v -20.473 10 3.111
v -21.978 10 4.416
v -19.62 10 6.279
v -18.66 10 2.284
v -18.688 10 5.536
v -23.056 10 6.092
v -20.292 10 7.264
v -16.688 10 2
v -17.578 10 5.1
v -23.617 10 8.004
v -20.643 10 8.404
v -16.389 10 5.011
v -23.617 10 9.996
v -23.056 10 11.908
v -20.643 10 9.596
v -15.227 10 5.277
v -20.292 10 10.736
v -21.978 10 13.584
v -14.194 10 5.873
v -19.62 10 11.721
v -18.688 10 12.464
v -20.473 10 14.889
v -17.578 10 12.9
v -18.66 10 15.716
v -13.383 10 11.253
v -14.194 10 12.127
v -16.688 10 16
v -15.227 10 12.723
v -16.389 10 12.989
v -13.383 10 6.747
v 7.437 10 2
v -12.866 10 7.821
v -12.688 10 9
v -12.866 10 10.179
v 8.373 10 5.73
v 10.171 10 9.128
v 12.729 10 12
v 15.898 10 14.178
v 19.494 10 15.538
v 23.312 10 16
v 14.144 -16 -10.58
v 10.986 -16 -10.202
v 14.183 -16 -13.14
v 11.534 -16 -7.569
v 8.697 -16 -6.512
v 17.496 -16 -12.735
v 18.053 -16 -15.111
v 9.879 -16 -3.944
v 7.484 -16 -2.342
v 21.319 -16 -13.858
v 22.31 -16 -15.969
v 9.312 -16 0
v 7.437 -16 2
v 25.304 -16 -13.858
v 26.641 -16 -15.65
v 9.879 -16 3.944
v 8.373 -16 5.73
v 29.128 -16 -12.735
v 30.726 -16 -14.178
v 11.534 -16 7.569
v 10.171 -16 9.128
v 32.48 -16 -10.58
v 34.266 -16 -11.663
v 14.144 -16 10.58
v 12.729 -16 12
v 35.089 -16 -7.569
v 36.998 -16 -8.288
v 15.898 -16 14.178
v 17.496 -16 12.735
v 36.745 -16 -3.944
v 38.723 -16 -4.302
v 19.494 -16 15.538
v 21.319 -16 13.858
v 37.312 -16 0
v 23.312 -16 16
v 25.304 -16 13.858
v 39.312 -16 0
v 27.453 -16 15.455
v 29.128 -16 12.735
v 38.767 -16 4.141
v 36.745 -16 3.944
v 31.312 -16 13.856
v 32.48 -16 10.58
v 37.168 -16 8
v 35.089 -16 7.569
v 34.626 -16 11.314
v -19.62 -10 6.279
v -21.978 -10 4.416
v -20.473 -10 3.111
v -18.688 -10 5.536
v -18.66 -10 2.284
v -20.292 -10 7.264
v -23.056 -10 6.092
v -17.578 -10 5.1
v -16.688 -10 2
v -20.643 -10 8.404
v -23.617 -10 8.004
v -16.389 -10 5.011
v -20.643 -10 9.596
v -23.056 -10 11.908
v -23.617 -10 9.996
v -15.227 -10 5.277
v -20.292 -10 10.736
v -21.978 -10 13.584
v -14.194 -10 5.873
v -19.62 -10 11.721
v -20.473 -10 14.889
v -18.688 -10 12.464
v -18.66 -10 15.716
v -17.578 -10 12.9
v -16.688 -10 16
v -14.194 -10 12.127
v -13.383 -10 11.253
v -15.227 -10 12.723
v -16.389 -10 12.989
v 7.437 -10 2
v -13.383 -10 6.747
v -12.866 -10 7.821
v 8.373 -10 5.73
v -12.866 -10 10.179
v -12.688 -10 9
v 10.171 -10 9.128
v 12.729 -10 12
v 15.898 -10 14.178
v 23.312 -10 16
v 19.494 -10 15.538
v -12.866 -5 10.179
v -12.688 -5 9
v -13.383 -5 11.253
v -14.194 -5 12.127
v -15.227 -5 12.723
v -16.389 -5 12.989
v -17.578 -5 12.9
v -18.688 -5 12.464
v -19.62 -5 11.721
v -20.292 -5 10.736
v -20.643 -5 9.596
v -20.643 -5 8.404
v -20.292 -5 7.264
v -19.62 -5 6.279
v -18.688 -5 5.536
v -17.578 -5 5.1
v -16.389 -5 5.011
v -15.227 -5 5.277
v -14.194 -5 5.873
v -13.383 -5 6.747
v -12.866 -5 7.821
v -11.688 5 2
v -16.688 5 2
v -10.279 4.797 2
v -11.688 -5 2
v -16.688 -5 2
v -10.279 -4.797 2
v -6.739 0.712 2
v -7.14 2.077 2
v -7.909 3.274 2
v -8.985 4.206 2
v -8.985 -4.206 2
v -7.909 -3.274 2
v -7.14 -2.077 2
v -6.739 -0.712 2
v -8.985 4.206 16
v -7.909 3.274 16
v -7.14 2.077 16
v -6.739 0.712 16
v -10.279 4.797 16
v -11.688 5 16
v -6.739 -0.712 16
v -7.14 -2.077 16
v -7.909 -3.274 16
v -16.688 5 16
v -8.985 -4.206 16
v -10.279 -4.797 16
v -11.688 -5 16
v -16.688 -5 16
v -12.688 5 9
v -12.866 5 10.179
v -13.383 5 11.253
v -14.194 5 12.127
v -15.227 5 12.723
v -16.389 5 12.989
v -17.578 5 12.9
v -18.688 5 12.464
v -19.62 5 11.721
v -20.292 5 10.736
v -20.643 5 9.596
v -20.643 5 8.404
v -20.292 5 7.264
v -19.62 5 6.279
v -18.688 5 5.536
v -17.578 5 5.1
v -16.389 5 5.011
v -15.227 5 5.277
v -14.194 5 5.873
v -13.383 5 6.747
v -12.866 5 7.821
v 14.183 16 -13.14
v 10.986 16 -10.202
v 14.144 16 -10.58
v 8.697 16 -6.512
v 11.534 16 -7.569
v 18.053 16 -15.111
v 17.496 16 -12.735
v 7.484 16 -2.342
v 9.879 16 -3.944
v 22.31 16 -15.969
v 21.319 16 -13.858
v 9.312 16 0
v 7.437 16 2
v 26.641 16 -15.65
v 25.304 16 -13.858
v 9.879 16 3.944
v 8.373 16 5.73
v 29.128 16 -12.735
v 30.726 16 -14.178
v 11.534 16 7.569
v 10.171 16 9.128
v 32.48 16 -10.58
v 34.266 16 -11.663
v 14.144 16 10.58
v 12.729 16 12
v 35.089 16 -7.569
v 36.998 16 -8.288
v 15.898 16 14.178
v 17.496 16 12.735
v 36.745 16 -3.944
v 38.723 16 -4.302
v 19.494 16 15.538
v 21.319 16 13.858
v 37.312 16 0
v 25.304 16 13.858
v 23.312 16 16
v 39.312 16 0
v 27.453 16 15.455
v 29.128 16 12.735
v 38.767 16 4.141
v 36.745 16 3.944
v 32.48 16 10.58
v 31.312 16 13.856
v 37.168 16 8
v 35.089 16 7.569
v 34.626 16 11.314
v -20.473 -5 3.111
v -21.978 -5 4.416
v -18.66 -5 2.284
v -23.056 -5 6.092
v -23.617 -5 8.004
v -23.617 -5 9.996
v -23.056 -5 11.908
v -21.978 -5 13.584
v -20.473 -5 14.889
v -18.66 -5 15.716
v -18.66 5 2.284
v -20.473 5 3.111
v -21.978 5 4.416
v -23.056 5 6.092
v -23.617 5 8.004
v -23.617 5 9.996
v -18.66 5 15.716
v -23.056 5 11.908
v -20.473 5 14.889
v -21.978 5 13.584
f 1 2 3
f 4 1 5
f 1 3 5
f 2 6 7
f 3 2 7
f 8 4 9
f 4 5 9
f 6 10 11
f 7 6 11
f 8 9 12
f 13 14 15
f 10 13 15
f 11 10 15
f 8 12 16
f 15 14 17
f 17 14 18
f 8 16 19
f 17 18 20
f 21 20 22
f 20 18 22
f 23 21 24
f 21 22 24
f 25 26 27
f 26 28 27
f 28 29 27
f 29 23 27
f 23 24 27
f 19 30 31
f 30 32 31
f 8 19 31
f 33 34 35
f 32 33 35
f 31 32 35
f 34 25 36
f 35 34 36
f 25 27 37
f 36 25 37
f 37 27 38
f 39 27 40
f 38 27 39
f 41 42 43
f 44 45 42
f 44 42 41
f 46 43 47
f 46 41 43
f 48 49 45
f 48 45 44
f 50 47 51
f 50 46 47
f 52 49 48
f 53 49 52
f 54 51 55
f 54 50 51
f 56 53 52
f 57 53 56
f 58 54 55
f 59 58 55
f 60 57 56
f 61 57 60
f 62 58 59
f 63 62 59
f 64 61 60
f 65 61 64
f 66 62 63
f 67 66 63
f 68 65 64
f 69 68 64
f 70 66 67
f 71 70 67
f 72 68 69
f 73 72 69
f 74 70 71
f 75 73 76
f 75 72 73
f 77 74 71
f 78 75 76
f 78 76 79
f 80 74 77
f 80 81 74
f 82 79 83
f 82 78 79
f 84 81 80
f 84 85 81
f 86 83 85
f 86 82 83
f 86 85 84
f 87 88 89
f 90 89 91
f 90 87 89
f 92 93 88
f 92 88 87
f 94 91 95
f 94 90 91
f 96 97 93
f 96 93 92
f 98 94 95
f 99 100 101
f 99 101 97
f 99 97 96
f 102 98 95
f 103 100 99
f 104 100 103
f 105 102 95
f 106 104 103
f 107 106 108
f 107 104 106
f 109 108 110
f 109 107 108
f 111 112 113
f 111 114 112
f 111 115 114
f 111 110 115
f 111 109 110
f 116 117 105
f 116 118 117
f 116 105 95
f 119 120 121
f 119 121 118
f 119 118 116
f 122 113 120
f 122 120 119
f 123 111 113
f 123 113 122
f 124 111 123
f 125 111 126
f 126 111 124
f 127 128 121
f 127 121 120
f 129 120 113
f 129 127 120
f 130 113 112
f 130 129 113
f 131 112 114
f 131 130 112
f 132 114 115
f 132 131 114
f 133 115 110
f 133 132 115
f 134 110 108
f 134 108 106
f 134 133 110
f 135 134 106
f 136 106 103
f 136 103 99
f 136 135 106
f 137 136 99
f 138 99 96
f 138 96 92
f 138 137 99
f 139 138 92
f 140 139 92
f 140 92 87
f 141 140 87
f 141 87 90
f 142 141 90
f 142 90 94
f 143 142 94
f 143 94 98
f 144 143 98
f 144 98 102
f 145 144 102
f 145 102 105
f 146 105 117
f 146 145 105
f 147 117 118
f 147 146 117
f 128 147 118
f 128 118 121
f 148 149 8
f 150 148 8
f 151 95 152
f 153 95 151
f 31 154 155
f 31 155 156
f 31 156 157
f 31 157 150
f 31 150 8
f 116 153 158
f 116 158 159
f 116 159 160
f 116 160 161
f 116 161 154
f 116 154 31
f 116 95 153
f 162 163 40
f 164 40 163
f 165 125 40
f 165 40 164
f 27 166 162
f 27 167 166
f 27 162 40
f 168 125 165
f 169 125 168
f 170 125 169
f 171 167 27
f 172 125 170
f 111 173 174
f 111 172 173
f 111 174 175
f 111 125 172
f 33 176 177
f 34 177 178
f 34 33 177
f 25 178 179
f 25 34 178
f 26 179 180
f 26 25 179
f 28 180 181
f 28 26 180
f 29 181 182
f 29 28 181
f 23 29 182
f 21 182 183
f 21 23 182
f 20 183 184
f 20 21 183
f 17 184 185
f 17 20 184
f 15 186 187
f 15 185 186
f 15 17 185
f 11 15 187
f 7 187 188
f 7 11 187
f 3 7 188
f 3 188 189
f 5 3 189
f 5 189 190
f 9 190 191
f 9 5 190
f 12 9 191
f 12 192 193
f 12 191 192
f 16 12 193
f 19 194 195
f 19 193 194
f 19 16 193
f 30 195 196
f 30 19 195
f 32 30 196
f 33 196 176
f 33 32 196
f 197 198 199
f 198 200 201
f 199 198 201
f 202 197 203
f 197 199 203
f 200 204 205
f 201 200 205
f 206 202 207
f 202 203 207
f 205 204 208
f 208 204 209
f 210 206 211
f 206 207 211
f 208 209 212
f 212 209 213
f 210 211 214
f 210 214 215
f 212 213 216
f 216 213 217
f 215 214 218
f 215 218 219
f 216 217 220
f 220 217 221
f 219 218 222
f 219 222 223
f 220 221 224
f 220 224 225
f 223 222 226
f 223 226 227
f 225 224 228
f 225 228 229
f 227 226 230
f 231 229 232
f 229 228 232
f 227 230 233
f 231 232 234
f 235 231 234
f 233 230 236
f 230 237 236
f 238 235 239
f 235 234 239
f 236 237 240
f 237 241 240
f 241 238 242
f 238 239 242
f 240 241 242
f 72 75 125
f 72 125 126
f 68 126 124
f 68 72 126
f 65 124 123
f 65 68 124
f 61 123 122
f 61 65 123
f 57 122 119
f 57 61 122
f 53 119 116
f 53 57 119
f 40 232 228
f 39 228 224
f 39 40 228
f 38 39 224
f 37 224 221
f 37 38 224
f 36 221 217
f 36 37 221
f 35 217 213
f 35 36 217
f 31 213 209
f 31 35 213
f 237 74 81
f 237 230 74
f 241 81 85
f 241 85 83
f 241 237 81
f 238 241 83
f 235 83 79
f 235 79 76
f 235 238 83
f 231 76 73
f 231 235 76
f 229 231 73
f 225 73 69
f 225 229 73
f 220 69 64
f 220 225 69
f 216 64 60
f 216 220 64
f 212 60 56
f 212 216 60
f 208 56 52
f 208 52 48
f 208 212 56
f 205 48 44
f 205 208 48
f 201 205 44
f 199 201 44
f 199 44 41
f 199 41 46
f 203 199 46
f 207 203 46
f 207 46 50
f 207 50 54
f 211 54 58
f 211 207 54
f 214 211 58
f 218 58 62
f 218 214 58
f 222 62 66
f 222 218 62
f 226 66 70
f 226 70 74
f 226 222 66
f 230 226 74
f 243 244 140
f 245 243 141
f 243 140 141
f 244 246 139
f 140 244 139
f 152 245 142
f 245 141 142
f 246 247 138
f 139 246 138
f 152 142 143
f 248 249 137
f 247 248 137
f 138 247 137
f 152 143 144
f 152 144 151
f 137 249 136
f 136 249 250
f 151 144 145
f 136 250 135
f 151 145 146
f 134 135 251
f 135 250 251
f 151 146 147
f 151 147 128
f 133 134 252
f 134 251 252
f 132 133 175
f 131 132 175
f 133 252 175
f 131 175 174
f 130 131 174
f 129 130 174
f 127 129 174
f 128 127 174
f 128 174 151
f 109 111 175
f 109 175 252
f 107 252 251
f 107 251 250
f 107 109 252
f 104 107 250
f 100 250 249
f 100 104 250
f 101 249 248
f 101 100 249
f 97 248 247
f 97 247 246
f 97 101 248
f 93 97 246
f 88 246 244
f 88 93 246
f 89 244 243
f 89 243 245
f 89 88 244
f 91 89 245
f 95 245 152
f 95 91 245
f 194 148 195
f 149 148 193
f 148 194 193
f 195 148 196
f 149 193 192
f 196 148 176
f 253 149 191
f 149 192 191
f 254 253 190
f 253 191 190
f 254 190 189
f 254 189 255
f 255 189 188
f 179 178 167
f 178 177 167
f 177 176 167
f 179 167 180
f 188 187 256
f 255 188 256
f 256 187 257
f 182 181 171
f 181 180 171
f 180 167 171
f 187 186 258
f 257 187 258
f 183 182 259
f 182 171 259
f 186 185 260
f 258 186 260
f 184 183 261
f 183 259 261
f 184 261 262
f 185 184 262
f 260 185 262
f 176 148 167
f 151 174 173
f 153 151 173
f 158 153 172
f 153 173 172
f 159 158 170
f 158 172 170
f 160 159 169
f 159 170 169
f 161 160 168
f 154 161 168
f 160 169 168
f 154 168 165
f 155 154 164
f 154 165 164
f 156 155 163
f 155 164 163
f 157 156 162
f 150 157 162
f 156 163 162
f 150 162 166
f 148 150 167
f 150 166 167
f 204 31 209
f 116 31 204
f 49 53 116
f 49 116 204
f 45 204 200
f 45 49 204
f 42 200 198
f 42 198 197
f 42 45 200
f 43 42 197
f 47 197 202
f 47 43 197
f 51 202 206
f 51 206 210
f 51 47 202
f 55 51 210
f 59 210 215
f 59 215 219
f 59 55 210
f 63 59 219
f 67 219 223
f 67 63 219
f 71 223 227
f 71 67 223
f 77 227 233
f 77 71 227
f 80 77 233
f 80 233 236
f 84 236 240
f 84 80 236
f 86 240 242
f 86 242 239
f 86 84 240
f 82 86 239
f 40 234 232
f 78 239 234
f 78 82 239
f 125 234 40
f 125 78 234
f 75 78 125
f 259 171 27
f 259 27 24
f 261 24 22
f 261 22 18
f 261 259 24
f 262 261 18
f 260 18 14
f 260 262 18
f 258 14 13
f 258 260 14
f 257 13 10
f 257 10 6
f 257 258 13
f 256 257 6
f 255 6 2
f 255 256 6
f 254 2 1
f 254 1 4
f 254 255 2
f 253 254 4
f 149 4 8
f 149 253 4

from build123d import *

# Parameters (mm, degrees)
F0_R     = 14
F1_DEPTH = 16
F0_R_2   = 4
F2_DEPTH = 10
F3_W     = 10
F3_H     = 10
F4_DEPTH = 25


with BuildPart() as f1:
    # F0 (on Front) → F1 (new body, symmetric)
    with BuildSketch(Plane.XZ):
        with BuildLine():
            ThreePointArc((7.437397, 2), (22.309938, -15.968596), (39.311905, 0))
            ThreePointArc((39.311905, 0), (34.625613, 11.313708), (23.311905, 16))
            ThreePointArc((23.311905, 16), (12.7289, 12), (7.437397, 2))
        make_face()
        with Locations((23.311905, 0)):
            Circle(F0_R, mode=Mode.SUBTRACT)
    extrude(amount=F1_DEPTH, both=True)

    # F0 (on Front) → F2 (join, symmetric)
    with BuildSketch(Plane.XZ):
        with BuildLine():
            ThreePointArc((7.437397, 2), (12.7289, 12), (23.311905, 16))
            Line((23.311905, 16), (-16.688095, 16))
            ThreePointArc((-16.688095, 16), (-23.688095, 9), (-16.688095, 2))
            Line((-16.688095, 2), (7.437397, 2))
        make_face()
        with Locations((-16.688095, 9)):
            Circle(F0_R_2, mode=Mode.SUBTRACT)
    extrude(amount=F2_DEPTH, both=True)

    # F3 (on face) → F4 (cut)
    with BuildSketch(Plane.XY.offset(16)):
        with Locations((-21.688095, 0)):
            Rectangle(F3_W, F3_H)
        with BuildLine():
            Line((-11.688095, 5), (-16.688095, 5))
            Line((-16.688095, 5), (-16.688095, -5))
            Line((-16.688095, -5), (-11.688095, -5))
            ThreePointArc((-11.688095, -5), (-6.688095, 0), (-11.688095, 5))
        make_face()
    extrude(amount=-F4_DEPTH, mode=Mode.SUBTRACT)


solid = f1.part
